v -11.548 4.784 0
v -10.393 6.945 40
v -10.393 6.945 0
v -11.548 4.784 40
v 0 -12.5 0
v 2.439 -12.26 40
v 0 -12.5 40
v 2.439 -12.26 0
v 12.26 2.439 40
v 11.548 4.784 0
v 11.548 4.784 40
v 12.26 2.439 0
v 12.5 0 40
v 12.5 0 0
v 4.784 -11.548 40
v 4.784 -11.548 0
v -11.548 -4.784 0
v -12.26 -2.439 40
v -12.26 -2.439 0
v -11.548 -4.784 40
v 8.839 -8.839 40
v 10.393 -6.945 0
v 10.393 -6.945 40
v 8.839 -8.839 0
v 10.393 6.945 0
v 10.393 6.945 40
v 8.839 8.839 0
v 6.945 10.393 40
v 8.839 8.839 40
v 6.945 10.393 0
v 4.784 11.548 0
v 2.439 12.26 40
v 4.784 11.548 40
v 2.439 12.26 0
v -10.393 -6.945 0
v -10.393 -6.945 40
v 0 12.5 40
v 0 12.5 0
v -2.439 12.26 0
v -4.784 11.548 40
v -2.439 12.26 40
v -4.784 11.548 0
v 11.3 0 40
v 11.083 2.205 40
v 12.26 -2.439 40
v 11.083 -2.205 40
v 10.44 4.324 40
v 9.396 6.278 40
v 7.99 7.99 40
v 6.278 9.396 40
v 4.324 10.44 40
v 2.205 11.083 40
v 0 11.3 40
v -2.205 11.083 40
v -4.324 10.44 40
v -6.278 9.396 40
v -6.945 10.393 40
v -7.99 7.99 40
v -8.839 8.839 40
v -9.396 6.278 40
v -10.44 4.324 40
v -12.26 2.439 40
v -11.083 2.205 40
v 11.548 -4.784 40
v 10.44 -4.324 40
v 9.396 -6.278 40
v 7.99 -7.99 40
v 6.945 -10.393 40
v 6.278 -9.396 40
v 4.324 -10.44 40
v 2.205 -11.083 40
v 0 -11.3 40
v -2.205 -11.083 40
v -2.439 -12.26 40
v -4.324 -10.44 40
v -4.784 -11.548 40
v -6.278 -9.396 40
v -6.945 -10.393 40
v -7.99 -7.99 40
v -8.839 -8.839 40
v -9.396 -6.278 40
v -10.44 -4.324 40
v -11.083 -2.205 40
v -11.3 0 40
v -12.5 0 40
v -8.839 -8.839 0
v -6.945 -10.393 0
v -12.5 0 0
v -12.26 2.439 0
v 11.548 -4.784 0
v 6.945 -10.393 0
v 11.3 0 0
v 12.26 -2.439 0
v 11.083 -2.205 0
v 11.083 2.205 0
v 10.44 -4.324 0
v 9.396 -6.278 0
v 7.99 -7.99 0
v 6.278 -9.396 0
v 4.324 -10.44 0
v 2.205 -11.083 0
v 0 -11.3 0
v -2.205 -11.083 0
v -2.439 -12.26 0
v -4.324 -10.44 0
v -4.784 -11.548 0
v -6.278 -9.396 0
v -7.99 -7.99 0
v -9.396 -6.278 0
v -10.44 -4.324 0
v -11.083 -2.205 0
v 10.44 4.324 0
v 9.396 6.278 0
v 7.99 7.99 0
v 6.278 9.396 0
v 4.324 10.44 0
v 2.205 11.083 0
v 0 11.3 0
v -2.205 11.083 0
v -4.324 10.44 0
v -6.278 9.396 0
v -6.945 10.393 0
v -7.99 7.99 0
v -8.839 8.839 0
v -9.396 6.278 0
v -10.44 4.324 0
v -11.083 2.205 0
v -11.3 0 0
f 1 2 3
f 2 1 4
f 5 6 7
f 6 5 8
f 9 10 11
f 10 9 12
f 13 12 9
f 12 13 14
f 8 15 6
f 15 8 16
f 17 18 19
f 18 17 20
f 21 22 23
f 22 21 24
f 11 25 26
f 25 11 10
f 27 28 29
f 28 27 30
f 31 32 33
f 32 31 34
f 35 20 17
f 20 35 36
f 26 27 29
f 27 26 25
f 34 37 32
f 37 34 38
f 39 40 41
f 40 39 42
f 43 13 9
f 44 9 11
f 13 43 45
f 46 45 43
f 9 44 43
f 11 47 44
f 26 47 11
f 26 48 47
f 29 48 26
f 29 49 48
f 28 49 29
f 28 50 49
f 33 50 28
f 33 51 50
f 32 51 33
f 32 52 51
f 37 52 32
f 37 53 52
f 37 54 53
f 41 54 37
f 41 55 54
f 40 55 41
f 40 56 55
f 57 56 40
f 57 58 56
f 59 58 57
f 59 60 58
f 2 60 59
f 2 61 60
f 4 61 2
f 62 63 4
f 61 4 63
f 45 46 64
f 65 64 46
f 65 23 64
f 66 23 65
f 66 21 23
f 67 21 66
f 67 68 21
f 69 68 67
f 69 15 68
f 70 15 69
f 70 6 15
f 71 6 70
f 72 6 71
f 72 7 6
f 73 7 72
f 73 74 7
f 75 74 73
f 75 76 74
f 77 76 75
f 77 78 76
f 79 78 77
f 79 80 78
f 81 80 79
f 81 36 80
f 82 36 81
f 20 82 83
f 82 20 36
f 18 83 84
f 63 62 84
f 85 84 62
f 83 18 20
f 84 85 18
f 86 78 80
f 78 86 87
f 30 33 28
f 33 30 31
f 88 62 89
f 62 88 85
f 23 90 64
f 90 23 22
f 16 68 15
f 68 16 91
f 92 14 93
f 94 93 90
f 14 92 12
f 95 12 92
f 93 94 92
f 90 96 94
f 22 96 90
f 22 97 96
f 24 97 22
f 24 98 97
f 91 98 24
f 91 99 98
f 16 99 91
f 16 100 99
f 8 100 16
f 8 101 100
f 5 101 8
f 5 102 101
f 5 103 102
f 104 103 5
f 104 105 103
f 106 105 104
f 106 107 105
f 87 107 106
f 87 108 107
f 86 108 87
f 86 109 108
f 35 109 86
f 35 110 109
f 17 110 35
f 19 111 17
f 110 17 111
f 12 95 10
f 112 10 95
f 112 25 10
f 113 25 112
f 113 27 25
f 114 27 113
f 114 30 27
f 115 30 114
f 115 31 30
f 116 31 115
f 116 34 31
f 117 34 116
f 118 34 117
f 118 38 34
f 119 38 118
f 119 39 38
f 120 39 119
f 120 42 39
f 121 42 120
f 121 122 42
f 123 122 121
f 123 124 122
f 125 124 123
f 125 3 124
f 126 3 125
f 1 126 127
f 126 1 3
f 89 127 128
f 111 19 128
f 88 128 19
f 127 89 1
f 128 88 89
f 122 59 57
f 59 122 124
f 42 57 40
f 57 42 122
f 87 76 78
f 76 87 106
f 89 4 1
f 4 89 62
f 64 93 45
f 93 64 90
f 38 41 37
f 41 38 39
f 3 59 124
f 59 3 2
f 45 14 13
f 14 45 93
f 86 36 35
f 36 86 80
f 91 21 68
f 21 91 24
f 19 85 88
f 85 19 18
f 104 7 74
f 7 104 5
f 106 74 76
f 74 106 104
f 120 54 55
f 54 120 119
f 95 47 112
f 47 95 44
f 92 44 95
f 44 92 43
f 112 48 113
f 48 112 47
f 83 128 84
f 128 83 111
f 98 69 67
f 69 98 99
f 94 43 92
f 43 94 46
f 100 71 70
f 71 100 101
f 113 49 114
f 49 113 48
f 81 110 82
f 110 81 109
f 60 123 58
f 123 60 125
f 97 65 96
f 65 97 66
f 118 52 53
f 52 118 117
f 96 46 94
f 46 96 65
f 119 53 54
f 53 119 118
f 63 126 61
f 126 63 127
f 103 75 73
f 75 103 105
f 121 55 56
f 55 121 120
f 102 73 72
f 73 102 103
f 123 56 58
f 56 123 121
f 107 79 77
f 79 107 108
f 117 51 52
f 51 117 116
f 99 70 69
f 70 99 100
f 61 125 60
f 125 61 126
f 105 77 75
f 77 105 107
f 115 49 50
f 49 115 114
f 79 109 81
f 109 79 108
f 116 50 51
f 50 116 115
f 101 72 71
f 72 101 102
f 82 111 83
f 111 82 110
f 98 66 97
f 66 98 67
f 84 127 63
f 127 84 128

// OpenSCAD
$fn = 32;

// ----------------------------------------------------------------------
// Thin tube: 1.2 mm wall
// ----------------------------------------------------------------------

// --- parameters (mm) ---
tube_od = 25;             // outer diameter
tube_h = 40;              // height, Z
wall = 1.2;               // wall thickness

difference() {
  cylinder(h = tube_h, d = tube_od);
  translate([0, 0, -1]) cylinder(h = tube_h + 2, d = tube_od - 2 * wall);
}
